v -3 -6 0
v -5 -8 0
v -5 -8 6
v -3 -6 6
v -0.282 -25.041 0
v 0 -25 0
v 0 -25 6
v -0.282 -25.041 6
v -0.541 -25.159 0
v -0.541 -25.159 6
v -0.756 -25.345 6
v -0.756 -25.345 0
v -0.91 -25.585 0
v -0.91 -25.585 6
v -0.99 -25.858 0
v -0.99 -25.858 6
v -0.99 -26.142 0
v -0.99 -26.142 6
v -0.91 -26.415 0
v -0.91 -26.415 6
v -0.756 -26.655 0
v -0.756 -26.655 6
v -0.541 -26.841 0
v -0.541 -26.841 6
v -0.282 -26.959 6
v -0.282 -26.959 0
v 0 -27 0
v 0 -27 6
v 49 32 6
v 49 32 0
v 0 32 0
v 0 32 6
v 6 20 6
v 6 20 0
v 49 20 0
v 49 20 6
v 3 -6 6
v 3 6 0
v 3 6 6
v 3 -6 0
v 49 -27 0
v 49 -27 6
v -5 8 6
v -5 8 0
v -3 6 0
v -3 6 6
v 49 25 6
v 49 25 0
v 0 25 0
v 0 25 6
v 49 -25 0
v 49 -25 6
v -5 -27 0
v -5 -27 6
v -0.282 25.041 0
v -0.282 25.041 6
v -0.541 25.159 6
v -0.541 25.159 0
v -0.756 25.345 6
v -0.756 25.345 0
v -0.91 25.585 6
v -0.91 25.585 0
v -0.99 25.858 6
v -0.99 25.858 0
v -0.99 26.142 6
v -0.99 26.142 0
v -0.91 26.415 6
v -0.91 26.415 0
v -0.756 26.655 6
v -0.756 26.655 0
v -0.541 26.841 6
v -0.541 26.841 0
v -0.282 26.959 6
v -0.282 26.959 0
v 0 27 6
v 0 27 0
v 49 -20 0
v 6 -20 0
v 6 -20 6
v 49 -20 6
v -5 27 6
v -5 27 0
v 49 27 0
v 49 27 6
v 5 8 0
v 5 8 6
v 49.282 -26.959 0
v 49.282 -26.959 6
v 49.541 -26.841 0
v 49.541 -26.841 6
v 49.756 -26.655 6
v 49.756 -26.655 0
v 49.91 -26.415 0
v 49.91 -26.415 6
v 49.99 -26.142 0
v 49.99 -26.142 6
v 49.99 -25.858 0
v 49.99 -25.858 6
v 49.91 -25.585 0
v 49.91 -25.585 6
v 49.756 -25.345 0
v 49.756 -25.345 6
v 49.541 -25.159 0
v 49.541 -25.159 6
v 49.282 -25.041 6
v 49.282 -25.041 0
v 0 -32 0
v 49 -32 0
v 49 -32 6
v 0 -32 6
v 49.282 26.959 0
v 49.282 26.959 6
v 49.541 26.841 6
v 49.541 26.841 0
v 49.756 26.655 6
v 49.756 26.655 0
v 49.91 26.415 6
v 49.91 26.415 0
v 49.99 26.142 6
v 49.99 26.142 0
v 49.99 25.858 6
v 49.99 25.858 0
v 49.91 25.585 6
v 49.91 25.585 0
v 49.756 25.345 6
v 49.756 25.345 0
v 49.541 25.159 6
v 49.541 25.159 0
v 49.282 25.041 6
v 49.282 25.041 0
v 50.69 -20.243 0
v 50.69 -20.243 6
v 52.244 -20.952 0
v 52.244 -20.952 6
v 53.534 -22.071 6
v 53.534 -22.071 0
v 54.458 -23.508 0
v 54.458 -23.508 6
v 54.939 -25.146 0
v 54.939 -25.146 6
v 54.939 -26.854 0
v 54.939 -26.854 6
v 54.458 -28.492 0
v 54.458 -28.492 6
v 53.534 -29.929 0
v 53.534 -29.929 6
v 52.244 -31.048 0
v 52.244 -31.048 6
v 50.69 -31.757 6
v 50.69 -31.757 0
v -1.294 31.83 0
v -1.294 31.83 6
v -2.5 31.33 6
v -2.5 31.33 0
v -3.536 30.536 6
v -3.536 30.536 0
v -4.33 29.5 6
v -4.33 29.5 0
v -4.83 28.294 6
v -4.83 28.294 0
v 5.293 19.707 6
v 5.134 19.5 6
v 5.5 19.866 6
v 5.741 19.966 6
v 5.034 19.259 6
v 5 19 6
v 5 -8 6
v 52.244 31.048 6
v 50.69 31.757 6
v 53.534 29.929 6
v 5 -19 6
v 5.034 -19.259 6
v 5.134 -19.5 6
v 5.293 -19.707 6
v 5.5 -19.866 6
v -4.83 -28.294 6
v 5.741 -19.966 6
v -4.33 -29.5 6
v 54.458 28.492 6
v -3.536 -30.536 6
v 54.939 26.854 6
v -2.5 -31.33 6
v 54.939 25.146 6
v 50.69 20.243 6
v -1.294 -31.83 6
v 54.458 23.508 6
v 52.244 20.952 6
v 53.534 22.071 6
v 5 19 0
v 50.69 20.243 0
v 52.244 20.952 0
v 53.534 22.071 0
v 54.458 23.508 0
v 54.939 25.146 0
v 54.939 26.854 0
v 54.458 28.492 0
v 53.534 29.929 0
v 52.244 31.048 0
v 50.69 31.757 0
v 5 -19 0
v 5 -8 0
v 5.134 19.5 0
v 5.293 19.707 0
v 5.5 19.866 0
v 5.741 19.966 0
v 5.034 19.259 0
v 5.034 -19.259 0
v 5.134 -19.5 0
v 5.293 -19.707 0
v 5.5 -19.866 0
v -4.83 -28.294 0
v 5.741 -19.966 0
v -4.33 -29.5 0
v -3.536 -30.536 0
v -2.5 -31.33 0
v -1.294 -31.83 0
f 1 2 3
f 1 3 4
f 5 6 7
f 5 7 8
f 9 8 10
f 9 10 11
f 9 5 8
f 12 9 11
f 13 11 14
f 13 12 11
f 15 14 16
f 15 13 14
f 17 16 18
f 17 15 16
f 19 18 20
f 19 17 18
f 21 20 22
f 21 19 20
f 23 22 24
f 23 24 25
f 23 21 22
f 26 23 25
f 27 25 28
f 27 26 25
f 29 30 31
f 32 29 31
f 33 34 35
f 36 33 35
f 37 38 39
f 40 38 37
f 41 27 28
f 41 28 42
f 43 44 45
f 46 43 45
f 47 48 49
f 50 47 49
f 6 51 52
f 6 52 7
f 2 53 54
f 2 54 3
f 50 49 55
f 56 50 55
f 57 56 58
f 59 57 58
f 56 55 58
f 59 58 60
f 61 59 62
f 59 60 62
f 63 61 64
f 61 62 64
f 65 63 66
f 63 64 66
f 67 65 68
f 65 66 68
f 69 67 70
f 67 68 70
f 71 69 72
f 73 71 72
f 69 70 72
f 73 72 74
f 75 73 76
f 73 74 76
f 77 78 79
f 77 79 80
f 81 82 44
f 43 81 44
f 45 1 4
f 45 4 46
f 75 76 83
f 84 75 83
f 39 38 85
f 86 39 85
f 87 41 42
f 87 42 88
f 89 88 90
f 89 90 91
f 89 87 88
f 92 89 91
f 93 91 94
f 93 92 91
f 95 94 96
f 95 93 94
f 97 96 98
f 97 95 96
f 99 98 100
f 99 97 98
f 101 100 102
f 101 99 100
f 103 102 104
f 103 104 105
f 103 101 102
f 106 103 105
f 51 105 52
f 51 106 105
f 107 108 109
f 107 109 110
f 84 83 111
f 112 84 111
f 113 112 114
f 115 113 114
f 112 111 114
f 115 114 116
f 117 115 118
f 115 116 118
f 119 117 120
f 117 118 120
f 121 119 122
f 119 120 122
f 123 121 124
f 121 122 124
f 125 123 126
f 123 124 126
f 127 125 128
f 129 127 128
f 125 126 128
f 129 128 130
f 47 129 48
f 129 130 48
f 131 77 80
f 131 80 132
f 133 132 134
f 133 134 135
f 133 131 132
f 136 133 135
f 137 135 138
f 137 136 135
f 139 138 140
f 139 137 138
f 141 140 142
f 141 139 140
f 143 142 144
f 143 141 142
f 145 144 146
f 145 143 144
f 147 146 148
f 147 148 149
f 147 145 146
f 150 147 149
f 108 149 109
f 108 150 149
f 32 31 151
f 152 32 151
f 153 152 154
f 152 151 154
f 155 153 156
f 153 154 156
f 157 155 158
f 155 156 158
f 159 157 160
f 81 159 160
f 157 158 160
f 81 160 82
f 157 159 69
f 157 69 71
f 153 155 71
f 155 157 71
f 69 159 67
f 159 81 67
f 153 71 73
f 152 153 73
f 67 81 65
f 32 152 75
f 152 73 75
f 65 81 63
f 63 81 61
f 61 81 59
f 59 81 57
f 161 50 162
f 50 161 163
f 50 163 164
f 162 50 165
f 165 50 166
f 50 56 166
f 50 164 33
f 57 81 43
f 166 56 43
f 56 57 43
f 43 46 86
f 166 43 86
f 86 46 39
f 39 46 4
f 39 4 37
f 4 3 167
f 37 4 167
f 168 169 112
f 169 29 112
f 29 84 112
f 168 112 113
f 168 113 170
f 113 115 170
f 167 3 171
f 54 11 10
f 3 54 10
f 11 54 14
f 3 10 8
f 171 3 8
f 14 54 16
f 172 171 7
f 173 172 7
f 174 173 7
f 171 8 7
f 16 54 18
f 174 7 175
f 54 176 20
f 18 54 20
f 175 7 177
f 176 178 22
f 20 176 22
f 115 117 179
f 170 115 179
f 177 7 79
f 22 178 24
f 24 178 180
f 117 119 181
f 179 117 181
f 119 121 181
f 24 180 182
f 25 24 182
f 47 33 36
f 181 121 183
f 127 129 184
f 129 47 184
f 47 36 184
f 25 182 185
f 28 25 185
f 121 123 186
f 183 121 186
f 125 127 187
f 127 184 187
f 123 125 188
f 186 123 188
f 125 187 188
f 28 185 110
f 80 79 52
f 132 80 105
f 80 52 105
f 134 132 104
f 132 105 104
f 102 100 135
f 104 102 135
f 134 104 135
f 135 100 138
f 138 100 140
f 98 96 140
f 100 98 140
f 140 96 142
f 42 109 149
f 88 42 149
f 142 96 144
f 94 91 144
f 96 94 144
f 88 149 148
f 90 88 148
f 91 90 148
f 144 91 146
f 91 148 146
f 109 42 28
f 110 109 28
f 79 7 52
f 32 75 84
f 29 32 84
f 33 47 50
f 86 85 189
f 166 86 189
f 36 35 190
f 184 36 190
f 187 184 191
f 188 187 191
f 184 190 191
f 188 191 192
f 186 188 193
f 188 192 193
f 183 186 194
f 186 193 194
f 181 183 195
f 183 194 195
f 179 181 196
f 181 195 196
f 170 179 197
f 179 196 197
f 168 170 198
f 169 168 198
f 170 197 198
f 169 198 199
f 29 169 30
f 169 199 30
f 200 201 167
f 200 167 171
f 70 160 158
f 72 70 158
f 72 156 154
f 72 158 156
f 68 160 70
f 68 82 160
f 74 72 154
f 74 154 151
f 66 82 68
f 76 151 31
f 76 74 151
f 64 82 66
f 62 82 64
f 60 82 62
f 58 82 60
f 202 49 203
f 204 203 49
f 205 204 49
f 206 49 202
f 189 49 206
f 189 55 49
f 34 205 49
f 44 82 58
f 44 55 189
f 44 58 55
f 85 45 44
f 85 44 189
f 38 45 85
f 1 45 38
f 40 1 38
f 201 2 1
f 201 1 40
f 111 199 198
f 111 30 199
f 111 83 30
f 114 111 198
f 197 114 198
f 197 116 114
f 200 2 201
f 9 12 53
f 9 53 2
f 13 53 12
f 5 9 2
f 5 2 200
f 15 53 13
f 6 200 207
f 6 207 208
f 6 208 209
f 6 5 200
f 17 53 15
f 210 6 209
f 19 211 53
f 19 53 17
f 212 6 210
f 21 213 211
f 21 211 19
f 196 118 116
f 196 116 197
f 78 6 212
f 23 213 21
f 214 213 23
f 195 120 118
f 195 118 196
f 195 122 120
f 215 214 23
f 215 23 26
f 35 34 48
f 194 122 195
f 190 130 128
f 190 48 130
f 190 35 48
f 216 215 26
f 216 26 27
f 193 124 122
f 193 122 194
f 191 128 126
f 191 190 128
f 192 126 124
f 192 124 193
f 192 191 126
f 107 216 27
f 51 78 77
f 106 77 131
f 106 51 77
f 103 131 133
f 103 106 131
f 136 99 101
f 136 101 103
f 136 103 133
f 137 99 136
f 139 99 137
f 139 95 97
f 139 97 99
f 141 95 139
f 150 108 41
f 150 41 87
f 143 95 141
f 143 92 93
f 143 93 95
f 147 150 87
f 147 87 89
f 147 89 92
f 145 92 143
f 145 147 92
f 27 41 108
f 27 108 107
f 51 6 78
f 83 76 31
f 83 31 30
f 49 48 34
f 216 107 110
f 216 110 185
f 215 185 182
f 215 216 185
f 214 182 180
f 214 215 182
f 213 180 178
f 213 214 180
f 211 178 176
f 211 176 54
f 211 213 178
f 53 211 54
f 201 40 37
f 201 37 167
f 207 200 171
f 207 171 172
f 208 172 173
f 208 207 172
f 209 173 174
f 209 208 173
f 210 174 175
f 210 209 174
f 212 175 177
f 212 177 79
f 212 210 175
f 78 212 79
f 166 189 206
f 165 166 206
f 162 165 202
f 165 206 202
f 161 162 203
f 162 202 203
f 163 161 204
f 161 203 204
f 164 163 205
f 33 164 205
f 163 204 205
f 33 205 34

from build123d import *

# Parameters (mm, degrees)
BOSS_EXTRUDE1_DEPTH = 6


with BuildPart() as part:
    # Sketch1 → Boss-Extrude1 (new body)
    with BuildSketch(Plane.XY):
        with BuildLine():
            Line((3, 6), (5, 8))
            Line((5, 8), (5, 19))
            ThreePointArc((5, 19), (5.292893219, 19.707106781), (6, 20))
            Line((6, 20), (49, 20))
            ThreePointArc((49, 20), (55, 26), (49, 32))
            Line((49, 32), (0, 32))
            ThreePointArc((0, 32), (-3.535533906, 30.535533906), (-5, 27))
            Line((-5, 27), (-5, 8))
            Line((-5, 8), (-3, 6))
            Line((-3, 6), (-3, 0))
            Line((-3, 0), (3, 0))
            Line((3, 0), (3, 6))
        make_face()
        with BuildLine():
            Line((0, 27), (49, 27))
            ThreePointArc((49, 27), (50, 26), (49, 25))
            Line((49, 25), (0, 25))
            ThreePointArc((0, 25), (-1, 26), (0, 27))
        make_face(mode=Mode.SUBTRACT)
    boss_extrude1 = extrude(amount=BOSS_EXTRUDE1_DEPTH)

    # Mirror1: Boss-Extrude1 across plane
    add(boss_extrude1.mirror(Plane(origin=(-3, 0, 6), x_dir=(0, 0, 1), z_dir=(0, 1, 0))))


solid = part.part
